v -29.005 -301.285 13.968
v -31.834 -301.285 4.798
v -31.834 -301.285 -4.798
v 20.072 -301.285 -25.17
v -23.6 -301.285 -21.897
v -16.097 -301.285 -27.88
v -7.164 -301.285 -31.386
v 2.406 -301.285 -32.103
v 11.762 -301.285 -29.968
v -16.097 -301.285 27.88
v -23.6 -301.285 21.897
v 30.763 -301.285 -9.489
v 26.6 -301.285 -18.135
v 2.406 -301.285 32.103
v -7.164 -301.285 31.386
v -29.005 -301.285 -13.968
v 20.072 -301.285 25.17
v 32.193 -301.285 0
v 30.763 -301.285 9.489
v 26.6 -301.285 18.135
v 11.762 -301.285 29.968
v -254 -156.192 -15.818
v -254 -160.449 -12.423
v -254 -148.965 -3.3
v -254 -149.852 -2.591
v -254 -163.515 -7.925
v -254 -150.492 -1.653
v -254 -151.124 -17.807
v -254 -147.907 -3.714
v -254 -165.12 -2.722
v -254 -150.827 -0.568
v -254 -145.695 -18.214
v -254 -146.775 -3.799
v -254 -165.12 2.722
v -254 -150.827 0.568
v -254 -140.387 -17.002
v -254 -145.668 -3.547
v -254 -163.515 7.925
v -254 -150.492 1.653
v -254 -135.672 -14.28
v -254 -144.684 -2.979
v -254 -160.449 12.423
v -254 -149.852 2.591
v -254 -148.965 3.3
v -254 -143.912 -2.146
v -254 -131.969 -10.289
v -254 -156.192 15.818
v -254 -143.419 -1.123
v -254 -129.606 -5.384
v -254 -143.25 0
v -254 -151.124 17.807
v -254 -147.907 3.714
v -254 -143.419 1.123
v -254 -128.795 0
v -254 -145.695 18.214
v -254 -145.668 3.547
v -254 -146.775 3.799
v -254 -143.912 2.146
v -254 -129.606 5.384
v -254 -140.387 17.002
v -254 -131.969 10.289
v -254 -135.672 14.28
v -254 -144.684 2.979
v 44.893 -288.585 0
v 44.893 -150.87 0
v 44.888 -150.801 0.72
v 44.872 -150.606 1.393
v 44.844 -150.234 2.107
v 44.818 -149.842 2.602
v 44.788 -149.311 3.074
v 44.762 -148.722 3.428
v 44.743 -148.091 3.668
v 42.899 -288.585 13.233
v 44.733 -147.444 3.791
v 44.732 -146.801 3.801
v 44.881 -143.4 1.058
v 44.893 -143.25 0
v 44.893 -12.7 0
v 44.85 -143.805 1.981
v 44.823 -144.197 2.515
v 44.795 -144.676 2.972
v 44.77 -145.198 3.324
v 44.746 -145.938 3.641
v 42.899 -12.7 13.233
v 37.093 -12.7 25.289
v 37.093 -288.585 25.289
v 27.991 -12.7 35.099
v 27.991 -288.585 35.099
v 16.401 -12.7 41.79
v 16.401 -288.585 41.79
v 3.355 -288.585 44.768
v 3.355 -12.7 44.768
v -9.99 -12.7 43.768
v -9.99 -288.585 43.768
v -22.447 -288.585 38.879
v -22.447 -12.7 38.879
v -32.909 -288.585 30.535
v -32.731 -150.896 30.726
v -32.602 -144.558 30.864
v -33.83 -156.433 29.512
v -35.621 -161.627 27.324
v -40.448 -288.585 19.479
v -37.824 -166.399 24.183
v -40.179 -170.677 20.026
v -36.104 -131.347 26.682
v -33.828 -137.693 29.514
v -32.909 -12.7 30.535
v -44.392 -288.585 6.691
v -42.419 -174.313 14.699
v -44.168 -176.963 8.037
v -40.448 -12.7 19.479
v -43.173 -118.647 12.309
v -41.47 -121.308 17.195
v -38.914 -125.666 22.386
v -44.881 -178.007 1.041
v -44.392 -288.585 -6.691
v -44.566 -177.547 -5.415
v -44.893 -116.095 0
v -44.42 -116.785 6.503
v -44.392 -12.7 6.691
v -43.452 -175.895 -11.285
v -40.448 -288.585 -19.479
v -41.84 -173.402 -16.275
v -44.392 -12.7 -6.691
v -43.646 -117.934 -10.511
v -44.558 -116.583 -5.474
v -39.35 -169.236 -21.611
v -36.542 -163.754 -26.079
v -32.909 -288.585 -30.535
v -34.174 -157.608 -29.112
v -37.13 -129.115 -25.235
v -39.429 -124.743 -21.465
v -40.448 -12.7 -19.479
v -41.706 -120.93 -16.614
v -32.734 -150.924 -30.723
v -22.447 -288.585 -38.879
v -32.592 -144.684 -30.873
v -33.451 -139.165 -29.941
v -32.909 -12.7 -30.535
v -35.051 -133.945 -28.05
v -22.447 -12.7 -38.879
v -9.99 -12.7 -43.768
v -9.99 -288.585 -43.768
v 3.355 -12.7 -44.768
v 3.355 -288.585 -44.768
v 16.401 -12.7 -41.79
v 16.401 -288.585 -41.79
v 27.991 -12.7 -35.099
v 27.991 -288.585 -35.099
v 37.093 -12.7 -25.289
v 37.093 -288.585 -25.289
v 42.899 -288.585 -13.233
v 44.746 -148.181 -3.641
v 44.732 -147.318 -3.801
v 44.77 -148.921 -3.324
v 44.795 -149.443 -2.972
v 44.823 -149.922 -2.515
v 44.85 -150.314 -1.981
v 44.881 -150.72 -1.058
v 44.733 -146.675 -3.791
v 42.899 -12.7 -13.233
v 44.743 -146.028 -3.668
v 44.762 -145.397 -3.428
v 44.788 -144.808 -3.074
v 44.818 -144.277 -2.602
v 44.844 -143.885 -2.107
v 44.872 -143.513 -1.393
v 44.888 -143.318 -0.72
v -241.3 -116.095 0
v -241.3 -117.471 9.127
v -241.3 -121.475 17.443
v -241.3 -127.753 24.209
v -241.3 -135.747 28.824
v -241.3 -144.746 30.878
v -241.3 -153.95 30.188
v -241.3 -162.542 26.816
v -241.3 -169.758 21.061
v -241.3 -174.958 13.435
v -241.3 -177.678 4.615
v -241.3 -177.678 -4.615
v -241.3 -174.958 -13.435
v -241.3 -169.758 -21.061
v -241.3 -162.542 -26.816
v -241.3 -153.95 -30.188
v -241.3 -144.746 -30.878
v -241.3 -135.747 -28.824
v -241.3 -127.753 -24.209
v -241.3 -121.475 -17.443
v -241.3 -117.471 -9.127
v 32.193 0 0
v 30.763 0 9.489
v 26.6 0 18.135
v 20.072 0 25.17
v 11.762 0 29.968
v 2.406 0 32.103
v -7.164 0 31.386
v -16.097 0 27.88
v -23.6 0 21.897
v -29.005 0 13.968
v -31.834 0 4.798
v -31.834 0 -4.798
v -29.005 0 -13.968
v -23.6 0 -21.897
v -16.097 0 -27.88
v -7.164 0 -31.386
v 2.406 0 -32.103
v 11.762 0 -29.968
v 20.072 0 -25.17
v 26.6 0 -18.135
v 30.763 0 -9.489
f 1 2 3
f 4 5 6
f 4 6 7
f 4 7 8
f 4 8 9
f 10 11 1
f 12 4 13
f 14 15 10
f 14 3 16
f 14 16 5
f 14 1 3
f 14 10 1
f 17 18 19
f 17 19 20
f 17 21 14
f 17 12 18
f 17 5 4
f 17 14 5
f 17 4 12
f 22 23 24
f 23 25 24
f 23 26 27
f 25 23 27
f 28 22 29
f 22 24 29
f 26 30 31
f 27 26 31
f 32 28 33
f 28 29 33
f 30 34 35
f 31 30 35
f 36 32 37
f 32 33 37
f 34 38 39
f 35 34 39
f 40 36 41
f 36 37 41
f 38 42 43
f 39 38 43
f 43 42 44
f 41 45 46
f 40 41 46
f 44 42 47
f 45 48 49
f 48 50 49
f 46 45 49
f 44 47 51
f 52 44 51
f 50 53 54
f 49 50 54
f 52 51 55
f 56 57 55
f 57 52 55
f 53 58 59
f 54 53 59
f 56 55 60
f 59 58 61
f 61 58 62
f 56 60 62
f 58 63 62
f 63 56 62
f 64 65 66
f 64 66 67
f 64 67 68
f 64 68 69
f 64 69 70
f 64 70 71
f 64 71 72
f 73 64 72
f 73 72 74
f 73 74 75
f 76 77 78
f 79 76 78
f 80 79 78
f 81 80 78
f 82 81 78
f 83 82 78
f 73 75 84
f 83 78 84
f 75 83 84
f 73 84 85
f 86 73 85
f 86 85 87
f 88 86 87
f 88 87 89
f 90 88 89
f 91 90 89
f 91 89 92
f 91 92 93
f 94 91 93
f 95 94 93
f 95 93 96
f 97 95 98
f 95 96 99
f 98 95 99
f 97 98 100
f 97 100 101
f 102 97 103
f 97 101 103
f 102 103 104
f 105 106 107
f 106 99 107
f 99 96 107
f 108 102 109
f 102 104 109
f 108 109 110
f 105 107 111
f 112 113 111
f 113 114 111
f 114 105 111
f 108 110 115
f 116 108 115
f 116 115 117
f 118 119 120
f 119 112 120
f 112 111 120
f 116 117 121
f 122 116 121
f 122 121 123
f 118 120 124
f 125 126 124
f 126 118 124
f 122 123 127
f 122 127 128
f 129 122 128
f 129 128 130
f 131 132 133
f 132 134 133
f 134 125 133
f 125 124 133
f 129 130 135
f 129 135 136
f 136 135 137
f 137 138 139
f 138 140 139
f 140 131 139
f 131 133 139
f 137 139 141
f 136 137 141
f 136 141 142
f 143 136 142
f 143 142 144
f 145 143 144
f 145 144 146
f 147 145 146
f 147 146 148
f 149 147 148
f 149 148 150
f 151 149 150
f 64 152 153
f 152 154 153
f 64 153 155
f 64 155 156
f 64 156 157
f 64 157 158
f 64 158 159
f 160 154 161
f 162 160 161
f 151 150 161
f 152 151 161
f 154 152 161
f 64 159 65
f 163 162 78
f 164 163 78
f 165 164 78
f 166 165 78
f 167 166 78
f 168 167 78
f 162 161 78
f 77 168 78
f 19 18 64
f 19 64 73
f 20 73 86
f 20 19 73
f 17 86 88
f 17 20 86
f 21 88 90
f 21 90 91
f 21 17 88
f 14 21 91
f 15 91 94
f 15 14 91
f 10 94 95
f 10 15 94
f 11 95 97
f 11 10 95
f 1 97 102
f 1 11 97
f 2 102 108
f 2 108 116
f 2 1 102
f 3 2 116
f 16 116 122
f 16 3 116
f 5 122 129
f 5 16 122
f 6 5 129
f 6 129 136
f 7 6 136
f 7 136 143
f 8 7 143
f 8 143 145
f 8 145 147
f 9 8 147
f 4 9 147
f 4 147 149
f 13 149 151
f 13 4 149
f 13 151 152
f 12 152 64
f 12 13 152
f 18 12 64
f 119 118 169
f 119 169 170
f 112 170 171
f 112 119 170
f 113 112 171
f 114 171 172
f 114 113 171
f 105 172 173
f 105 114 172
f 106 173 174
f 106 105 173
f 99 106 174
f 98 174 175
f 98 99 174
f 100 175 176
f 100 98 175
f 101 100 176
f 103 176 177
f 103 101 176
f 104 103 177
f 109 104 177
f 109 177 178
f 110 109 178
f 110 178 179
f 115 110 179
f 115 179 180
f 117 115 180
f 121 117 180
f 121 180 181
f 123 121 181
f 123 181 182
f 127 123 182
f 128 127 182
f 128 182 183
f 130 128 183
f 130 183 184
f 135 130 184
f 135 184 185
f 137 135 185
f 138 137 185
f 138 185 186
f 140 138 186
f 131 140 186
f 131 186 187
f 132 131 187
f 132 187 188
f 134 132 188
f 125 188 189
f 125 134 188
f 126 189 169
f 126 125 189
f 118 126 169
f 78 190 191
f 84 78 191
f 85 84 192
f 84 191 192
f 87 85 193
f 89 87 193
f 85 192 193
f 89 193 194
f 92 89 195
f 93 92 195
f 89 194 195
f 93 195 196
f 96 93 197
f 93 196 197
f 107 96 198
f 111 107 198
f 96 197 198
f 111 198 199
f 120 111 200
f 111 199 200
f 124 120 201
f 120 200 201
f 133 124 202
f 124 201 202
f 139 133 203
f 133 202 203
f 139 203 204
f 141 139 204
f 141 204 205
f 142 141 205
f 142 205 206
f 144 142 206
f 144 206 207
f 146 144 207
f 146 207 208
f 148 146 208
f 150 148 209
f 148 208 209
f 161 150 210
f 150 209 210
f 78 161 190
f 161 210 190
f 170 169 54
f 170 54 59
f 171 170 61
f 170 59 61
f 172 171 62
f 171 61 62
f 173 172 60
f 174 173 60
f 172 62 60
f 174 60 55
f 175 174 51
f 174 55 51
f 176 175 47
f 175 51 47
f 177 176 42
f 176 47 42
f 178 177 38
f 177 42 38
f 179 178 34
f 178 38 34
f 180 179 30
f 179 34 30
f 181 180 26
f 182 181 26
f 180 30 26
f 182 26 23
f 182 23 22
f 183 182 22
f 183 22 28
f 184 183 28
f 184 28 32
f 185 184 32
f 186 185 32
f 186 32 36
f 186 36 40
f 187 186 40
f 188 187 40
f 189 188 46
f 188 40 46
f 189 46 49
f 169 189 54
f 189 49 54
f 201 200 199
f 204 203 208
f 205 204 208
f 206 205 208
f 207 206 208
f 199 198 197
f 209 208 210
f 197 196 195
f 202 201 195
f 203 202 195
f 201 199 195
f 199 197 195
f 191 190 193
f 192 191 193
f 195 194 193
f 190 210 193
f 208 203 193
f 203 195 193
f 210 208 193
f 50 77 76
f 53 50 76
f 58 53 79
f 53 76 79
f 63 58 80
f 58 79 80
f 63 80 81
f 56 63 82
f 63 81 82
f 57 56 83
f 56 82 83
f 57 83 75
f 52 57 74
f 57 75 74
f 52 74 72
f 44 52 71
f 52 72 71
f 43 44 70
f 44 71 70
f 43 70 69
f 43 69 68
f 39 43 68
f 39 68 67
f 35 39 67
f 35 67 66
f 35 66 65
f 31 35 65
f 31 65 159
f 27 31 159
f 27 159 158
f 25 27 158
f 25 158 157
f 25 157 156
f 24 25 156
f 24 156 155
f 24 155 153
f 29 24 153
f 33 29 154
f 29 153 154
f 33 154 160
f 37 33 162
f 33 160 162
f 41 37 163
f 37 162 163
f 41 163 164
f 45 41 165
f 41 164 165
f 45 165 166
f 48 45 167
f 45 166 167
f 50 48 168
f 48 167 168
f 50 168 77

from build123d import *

# Parameters (mm, degrees)
F0_R     = 44.893499
F1_DEPTH = 301.28476
F2_SIZE  = 12.7
F3_R     = 30.964692
F4_DEPTH = 254
F5_SIZE  = 12.7
F7_D     = 7.62


with BuildPart() as f1:
    # F0 (on Front) → F1 (new body)
    with BuildSketch(Plane.XZ):
        Circle(F0_R)
    extrude(amount=F1_DEPTH)

    # F2
    f2_edges = [f1.edges().sort_by_distance(p)[0] for p in [
        (44.893499, -150.64238, 0),
        (-44.893499, 0, 0),
        (-44.893499, -301.28476, 0),
    ]]
    chamfer(f2_edges, length=F2_SIZE)

    # F3 (on Right) → F4 (join)
    with BuildSketch(Plane.YZ):
        with Locations((-147.05956, 0)):
            Circle(F3_R)
    extrude(amount=-F4_DEPTH)

    # F5
    f5_edges = [f1.edges().sort_by_distance(p)[0] for p in [
        (-254, -178.024252, 0),
    ]]
    chamfer(f5_edges, length=F5_SIZE)

    # F7 (through all)
    with Locations(Plane(origin=(-254, 0, 0), x_dir=(0, -1, 0), z_dir=(-1, 0, 0))):
        with Locations((147.05956, 0)):
            Hole(F7_D / 2)


solid = f1.part
